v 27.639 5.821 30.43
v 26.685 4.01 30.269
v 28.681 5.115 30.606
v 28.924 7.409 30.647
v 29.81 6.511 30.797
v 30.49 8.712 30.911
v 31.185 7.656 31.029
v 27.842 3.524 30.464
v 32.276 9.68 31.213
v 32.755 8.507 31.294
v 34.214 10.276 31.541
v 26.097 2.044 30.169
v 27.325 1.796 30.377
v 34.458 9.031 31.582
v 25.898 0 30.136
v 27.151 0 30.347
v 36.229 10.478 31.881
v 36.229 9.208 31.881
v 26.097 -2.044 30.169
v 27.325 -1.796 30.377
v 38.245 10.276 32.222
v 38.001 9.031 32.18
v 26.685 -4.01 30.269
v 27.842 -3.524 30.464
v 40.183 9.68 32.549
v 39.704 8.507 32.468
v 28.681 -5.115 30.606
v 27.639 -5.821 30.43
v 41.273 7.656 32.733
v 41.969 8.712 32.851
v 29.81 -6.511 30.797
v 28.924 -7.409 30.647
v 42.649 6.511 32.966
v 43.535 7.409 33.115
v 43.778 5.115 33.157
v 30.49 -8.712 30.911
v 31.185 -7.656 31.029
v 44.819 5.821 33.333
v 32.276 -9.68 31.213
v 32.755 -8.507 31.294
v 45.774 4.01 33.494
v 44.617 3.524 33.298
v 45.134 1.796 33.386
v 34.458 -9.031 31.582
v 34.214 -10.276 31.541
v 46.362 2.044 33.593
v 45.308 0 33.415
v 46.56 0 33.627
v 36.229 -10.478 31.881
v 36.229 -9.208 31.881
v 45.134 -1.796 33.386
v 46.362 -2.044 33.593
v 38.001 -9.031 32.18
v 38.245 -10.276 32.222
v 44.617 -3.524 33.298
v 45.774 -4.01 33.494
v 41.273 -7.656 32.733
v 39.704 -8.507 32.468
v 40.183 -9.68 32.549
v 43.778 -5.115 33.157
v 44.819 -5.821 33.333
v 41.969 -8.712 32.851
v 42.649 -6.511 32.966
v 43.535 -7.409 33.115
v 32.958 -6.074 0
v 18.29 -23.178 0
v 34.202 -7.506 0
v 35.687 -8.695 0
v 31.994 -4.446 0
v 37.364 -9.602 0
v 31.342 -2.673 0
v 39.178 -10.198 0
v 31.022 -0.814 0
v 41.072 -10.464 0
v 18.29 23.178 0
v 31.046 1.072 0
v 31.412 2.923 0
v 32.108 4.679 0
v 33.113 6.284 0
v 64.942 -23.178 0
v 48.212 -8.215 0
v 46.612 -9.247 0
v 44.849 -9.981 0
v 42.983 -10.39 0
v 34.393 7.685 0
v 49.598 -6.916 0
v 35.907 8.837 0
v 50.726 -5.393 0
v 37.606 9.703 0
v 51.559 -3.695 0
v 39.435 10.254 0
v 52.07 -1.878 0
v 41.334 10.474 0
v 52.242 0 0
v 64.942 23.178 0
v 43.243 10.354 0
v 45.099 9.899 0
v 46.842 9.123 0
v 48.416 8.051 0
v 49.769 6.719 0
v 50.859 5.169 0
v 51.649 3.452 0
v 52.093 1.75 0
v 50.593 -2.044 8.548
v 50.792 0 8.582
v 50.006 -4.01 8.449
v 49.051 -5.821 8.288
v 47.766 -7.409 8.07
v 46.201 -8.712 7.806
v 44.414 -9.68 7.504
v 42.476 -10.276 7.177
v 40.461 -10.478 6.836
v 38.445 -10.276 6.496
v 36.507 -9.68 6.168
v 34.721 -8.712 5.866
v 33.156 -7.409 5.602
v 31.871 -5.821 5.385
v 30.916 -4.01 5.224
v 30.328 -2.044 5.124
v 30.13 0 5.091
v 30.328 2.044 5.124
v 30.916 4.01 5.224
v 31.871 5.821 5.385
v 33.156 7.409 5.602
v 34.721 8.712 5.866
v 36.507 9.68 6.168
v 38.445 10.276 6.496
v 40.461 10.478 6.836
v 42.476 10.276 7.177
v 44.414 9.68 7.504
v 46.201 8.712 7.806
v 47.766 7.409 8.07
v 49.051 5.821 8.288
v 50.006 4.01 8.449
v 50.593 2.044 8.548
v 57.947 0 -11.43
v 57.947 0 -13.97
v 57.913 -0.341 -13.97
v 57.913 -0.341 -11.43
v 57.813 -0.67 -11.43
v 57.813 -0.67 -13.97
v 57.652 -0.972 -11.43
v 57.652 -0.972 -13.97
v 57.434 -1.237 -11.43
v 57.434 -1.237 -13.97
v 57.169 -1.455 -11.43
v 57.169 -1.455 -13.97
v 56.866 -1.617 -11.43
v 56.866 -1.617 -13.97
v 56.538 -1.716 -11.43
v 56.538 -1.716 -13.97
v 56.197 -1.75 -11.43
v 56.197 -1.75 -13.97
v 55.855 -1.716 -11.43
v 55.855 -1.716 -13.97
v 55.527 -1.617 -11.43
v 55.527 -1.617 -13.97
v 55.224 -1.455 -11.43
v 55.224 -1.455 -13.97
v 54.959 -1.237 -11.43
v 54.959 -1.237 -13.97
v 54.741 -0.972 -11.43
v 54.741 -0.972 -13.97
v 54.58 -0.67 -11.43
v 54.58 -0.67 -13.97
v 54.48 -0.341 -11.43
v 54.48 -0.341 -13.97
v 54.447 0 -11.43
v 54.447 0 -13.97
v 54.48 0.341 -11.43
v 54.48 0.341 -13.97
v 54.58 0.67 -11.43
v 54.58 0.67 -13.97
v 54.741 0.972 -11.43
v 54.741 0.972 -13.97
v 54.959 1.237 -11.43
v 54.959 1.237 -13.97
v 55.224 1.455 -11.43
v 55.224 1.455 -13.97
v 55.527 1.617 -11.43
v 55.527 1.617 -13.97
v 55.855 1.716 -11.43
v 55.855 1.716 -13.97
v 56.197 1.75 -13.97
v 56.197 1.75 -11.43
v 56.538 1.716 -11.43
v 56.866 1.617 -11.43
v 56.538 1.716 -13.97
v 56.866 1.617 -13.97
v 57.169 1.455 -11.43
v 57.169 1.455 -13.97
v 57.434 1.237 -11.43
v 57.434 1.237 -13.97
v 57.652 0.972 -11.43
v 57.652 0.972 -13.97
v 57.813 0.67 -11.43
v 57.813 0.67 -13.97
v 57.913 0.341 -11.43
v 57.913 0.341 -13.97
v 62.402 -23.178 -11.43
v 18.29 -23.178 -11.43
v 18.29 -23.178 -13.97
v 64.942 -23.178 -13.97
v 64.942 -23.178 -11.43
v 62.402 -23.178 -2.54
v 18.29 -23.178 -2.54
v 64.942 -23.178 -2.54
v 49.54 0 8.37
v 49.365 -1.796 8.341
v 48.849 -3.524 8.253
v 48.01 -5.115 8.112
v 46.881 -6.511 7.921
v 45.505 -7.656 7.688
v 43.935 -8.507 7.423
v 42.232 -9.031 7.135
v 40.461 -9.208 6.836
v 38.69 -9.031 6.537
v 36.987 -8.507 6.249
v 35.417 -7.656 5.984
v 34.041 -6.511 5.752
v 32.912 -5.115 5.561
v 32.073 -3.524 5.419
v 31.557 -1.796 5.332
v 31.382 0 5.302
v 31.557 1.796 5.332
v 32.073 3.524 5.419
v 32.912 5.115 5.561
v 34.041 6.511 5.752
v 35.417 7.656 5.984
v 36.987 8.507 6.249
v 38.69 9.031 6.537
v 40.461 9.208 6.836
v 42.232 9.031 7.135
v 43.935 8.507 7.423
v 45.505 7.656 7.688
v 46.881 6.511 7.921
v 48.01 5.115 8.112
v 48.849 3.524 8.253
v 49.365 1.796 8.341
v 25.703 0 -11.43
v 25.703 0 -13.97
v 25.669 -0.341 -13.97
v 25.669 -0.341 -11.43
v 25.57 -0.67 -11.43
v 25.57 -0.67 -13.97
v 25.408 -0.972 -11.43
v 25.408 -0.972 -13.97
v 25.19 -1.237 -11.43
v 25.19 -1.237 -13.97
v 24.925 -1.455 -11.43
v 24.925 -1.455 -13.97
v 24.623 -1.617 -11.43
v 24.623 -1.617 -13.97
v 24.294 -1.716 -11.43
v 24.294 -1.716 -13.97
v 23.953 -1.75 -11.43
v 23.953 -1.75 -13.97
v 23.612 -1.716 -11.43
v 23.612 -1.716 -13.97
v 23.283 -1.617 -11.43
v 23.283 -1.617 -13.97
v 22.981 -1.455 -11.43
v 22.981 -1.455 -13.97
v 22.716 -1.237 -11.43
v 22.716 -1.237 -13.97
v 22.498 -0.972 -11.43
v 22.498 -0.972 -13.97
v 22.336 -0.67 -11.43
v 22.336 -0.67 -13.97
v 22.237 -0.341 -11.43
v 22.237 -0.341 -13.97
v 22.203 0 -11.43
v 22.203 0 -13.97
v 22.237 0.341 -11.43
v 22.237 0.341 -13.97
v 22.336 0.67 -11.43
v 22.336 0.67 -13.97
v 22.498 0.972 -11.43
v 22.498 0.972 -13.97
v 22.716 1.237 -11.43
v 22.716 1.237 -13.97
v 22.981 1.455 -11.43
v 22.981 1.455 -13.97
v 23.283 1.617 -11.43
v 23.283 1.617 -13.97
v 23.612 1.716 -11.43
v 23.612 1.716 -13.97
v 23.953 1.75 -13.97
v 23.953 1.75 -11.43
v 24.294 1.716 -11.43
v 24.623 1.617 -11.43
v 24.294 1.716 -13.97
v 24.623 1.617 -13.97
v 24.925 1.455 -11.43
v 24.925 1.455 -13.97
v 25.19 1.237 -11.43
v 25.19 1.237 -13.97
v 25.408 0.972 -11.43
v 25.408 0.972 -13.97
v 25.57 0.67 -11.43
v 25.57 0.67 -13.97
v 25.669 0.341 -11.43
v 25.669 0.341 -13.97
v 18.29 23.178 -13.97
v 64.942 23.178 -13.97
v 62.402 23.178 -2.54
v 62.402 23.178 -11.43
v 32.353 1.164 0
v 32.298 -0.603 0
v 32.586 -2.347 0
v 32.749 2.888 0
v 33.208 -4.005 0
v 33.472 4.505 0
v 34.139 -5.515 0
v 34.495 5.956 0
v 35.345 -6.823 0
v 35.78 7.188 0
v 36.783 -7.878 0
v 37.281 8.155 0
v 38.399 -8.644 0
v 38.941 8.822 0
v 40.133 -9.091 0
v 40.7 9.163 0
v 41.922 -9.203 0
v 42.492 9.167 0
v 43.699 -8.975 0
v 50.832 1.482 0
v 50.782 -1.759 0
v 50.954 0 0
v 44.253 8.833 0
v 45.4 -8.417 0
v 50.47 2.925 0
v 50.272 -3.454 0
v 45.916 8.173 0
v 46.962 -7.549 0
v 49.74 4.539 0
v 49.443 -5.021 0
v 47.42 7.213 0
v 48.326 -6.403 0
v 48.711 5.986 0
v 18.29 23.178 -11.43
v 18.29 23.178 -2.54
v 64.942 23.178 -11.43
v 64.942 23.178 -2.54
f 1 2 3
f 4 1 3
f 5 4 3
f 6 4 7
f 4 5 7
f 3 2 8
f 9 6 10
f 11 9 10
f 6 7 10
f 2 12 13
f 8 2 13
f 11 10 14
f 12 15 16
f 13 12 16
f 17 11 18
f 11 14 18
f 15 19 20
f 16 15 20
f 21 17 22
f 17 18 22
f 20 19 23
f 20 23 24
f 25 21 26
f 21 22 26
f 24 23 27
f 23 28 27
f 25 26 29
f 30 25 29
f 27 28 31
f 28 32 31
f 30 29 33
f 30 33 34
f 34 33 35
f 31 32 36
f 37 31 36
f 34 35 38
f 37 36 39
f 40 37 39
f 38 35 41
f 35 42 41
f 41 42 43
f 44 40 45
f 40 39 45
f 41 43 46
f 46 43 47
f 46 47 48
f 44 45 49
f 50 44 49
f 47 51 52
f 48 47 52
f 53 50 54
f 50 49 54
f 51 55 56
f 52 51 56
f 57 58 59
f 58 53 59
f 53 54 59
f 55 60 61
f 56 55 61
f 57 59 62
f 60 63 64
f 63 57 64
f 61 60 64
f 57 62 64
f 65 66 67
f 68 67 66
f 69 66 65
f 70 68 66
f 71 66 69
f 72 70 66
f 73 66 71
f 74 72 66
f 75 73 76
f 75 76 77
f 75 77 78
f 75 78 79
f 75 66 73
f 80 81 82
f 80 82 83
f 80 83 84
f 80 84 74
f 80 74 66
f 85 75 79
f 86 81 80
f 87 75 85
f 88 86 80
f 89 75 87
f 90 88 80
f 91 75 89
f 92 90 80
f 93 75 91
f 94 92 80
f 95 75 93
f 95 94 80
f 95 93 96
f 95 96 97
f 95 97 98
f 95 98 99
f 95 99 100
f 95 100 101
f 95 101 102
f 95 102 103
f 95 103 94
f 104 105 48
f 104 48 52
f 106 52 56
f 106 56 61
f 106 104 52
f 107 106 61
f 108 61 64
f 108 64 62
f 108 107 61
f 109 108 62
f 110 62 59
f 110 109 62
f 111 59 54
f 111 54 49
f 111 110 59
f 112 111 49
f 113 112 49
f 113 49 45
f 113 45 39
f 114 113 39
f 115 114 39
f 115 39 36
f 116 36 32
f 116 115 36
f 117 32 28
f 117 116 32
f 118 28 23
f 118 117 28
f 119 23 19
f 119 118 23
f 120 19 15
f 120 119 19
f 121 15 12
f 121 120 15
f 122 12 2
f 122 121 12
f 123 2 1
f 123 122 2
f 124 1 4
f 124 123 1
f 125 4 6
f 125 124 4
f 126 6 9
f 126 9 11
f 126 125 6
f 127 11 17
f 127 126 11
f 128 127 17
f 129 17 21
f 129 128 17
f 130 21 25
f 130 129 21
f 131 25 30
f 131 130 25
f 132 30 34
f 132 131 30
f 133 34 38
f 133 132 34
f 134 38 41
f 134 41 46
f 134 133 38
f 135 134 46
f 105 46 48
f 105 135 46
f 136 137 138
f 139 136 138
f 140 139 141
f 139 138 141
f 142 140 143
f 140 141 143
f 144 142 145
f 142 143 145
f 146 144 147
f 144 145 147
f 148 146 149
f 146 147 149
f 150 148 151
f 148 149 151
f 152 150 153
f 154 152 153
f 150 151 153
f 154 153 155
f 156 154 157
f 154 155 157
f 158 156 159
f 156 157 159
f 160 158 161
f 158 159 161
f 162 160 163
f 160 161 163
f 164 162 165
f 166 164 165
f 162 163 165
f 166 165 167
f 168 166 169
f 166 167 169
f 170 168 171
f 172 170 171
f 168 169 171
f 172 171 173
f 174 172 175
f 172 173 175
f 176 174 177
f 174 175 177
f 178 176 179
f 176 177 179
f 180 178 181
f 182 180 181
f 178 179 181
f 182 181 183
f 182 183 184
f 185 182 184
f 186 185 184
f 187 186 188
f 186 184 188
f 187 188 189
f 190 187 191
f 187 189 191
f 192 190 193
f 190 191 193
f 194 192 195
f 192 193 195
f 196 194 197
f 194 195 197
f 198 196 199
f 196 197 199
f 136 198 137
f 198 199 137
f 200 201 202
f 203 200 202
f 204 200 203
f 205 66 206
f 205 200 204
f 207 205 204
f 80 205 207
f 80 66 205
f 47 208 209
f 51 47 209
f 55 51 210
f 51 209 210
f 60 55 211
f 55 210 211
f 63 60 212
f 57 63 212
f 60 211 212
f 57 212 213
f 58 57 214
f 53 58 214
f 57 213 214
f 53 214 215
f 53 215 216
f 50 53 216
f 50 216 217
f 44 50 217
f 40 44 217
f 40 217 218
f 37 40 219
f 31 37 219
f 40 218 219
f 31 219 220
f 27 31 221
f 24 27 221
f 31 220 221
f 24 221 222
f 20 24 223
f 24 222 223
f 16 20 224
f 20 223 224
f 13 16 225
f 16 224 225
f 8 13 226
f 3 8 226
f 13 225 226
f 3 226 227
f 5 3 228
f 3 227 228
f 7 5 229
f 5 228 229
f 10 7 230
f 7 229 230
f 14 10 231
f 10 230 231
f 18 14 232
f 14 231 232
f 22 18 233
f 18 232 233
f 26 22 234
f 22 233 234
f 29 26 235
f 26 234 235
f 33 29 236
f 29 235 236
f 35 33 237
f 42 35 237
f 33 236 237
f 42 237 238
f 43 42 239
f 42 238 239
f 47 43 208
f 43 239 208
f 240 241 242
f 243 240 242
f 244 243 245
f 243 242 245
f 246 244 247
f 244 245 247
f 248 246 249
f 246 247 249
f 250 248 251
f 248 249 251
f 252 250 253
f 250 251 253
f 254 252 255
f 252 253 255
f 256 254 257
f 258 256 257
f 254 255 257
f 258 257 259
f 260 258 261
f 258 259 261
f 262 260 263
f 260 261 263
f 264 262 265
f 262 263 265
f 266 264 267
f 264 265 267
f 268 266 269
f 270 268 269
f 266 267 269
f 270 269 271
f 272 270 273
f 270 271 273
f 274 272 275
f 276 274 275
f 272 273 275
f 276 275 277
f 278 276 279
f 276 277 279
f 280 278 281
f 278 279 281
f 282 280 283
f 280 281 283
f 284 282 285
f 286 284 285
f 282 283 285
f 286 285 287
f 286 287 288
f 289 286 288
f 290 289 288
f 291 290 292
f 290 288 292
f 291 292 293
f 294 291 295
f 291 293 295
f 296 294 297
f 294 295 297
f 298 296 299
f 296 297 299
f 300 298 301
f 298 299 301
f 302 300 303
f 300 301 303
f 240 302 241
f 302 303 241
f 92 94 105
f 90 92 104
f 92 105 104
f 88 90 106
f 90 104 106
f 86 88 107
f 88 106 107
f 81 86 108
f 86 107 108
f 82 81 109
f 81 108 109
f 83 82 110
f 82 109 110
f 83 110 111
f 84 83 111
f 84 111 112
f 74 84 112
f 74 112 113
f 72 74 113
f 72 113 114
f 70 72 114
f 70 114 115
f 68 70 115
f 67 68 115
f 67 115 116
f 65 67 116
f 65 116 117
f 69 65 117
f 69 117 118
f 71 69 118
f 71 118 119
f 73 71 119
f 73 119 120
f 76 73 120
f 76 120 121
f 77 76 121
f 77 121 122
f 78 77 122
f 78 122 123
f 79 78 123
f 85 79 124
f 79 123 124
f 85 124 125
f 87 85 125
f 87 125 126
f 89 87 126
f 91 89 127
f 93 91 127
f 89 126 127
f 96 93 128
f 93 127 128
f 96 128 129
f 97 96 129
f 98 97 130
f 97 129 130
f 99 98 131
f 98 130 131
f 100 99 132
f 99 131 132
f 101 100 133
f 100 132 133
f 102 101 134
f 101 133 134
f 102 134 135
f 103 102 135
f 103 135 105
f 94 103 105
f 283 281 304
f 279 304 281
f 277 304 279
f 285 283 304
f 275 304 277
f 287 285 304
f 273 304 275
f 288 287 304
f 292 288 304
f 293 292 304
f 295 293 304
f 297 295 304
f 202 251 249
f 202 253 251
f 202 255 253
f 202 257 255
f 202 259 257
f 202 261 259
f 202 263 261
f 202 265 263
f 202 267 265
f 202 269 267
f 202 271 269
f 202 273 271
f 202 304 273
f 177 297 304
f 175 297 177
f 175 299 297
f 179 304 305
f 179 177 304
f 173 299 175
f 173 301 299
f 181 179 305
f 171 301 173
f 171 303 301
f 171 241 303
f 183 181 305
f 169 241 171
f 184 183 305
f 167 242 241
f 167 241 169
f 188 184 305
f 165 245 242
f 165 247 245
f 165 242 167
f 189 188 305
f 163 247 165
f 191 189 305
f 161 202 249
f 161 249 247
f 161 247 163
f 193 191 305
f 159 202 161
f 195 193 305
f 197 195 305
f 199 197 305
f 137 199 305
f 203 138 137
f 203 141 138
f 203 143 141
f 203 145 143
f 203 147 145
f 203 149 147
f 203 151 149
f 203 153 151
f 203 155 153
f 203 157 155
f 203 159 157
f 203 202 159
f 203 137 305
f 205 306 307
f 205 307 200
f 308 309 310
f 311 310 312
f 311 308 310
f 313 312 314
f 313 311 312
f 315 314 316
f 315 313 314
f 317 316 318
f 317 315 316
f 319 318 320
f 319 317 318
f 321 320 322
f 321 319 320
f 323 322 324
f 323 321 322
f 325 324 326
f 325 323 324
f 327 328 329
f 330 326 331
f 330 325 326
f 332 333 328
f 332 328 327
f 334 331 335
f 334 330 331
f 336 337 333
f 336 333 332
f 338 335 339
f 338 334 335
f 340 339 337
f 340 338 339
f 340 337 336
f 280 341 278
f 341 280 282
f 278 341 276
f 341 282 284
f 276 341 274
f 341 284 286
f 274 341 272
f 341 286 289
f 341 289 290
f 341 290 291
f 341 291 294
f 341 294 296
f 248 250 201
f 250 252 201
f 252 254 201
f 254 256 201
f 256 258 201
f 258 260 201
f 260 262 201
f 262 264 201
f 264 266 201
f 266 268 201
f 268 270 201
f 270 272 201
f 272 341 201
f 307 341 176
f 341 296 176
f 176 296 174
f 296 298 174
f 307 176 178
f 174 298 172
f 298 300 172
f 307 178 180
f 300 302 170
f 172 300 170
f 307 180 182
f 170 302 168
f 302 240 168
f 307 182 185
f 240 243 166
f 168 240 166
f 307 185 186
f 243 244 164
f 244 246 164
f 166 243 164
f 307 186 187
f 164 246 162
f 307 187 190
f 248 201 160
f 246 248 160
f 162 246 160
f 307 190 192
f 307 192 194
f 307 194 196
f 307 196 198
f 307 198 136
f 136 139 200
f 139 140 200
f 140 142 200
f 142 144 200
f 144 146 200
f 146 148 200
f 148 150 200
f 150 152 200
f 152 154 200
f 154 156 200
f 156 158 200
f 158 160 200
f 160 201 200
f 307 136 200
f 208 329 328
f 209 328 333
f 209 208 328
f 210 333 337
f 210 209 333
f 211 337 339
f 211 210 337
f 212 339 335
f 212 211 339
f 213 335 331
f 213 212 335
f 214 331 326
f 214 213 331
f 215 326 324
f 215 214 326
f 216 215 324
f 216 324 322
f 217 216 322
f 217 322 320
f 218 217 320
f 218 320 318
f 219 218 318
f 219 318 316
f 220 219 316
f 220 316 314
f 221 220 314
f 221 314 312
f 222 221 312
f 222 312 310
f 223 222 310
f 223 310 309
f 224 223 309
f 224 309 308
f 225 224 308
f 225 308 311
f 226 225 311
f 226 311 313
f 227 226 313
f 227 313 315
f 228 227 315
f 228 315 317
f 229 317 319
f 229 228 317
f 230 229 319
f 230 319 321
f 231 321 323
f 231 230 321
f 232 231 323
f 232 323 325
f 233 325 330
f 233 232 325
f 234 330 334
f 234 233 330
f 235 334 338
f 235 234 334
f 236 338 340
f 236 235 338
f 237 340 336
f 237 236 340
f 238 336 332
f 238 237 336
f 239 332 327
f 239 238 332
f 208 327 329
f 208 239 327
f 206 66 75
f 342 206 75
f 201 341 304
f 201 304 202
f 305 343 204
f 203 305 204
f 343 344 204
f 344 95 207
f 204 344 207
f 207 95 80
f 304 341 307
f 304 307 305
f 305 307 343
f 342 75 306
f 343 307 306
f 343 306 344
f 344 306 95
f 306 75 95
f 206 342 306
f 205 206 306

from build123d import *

# Parameters (mm, degrees)
F2_R      = 10.4775
F2_R_2    = 9.2075
F3_DEPTH  = 25.4
F4_DEPTH  = 25.4
F5_W      = 41.5304042399
F5_H      = 20.5683773383
F6_DEPTH  = 127
F7_W      = 46.6519938795
F7_H      = 46.355
F8_DEPTH  = 2.54
F9_W      = 2.54
F9_H      = 46.355
F10_DEPTH = 8.89
F11_W     = 46.6519938795
F11_H     = 46.355
F12_DEPTH = 2.54
F13_R     = 1.7499965
F14_DEPTH = 2.54


with BuildPart() as f3:
    # F2 (on line) → F3 (new body)
    with BuildSketch(Plane(origin=(0, 0, 0), x_dir=(0.9860251287, 0, 0.1665966554), z_dir=(0.1665966554, 0, -0.9860251287))):
        with Locations((41.0343617785, 0)):
            Circle(F2_R)
        with Locations((41.0343617785, 0)):
            Circle(F2_R_2, mode=Mode.SUBTRACT)
    extrude(amount=-F3_DEPTH)

    # F4 (add): a face of the model
    f4_faces = [f3.faces().sort_by_distance(p)[0] for p in [
        (30.422040588, 0, 5.1400416329),
    ]]
    extrude(f4_faces, amount=F4_DEPTH)

    # F5 (on Front) → F6 (cut, symmetric)
    with BuildSketch(Plane.XZ):
        with Locations((39.1329098493, -10.2841886692)):
            Rectangle(F5_W, F5_H)
    extrude(amount=F6_DEPTH, both=True, mode=Mode.SUBTRACT)

    # F7 (on Top) → F8 (join)
    with BuildSketch(Plane.XY):
        with Locations((41.6159391729, 0)):
            Rectangle(F7_W, F7_H)
    extrude(amount=-F8_DEPTH)

    # F9 (on face) → F10 (join)
    with BuildSketch(Plane(origin=(0, 0, -2.54), x_dir=(1, 0, 0), z_dir=(0, 0, -1))):
        with Locations((63.6719361126, 0)):
            Rectangle(F9_W, F9_H)
    extrude(amount=F10_DEPTH)

    # F11 (on face) → F12 (join)
    with BuildSketch(Plane(origin=(0, 0, -11.43), x_dir=(1, 0, 0), z_dir=(0, 0, -1))):
        with Locations((41.6159391729, 0)):
            Rectangle(F11_W, F11_H)
    extrude(amount=F12_DEPTH)

    # F13 (on face) → F14 (cut)
    with BuildSketch(Plane(origin=(0, 0, -13.97), x_dir=(1, 0, 0), z_dir=(0, 0, -1))):
        with Locations((23.9529660876, 0)):
            Circle(F13_R)
        with Locations((56.1965306676, 0)):
            Circle(F13_R)
    extrude(amount=-F14_DEPTH, mode=Mode.SUBTRACT)


solid = f3.part
